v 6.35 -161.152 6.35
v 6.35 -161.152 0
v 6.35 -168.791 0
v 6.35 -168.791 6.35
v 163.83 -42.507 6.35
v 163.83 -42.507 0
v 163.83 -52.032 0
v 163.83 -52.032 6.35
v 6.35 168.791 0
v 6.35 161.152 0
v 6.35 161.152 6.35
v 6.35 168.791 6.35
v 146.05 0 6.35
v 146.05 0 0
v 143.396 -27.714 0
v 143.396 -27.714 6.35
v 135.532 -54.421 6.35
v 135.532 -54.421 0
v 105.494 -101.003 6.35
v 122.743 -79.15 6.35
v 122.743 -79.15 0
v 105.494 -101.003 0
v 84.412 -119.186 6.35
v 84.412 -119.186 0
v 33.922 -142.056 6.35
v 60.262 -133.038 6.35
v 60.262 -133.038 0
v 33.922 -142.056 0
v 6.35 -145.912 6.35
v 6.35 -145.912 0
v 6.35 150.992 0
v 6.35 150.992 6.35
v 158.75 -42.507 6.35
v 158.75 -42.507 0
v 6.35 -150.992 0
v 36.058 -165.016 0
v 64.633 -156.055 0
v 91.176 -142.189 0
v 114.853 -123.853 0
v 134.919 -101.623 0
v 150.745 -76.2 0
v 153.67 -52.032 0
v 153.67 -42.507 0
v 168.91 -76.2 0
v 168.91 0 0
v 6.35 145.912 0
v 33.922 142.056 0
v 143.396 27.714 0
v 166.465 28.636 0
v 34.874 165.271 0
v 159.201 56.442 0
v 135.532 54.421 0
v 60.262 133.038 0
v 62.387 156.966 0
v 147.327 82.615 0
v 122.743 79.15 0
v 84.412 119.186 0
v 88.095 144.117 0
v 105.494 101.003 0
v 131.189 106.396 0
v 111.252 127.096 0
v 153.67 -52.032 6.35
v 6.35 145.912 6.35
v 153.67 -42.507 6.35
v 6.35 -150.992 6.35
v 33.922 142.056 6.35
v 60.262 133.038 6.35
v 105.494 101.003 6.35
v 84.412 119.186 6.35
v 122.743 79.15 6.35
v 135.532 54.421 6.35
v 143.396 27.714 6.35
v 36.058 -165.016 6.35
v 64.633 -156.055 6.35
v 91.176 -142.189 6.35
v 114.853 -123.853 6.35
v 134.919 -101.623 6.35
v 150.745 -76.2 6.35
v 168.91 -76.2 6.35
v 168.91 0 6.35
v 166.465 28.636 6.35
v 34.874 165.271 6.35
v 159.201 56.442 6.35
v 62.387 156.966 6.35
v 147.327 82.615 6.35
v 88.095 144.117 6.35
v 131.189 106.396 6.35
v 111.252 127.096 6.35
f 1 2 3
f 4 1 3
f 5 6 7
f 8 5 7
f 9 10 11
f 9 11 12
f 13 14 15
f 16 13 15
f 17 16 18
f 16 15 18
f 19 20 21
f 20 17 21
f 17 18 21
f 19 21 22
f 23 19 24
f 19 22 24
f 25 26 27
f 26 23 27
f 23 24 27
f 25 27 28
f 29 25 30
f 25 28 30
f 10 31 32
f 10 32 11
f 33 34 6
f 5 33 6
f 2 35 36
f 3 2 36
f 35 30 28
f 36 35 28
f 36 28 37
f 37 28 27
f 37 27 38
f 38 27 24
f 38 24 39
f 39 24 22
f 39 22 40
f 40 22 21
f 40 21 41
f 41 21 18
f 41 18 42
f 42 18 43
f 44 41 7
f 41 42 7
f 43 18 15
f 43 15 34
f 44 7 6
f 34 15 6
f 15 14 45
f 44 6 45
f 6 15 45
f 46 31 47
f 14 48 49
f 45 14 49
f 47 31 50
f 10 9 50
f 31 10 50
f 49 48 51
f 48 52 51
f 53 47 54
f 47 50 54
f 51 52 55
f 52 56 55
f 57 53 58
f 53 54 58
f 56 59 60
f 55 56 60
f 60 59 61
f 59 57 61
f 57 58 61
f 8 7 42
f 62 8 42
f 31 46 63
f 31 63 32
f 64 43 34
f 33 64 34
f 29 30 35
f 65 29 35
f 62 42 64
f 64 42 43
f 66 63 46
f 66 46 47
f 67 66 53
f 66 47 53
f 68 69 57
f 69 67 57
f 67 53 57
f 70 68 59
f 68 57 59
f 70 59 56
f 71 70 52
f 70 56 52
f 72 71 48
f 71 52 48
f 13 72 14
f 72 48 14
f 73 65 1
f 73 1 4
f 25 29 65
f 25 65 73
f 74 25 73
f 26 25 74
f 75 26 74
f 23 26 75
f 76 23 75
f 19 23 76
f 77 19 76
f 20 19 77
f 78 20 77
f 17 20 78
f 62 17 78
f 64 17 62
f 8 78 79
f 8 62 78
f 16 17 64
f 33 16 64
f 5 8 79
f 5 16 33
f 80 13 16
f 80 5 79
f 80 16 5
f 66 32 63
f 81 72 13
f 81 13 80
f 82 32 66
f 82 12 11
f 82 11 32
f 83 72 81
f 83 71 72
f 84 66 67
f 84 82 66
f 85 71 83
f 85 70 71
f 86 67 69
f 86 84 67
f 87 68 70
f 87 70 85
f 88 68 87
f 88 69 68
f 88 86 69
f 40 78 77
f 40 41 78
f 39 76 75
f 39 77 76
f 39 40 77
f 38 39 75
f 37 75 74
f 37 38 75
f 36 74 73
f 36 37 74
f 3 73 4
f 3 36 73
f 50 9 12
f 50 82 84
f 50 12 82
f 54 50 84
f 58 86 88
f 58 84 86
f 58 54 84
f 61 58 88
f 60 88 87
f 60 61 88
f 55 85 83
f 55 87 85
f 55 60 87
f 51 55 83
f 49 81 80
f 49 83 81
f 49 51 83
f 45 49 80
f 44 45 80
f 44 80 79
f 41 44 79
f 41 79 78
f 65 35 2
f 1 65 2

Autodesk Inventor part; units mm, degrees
ref_plane "YZ Plane" through (0, 0, 0) normal (1, 0, 0) x (0, 1, 0)
ref_plane "XZ Plane" through (0, 0, 0) normal (0, 1, 0) x (-1, 0, 0)
ref_plane "XY Plane" through (0, 0, 0) normal (0, 0, 1) x (1, 0, 0)
sketch "Sketch1" plane through (0, 0, 0) normal (0, 0, 1) x (1, 0, 0)
  circle A0 centre (0, 0) radius 146.05
  arc A1 (168.91, 0) -> (150.7453, -76.2) centre (0, 0) ccw
  line L0 (6.35, -145.9119) -> (6.35, -168.7906)
  circle A2 centre (-157.48, 0) radius 3.175
  line L1 (6.35, -145.9119) -> (6.35, -150.9919)
  line L2 (6.35, -150.9919) -> (-6.35, -150.9919)
  line L3 (-6.35, -150.9919) -> (-6.35, -161.1519)
  line L4 (-6.35, -161.1519) -> (6.35, -161.1519)
  line L5 (6.35, -150.9919) -> (6.35, -161.1519)
  line L6 (6.35, 145.9119) -> (6.35, 168.7906)
  line L7 (0, 0) -> (0, 200.5264) construction
  line L8 (6.35, 145.9119) -> (6.35, 150.9919) construction
  line L9 (6.35, 150.9919) -> (-12.7, 150.9919)
  line L10 (-12.7, 150.9919) -> (-12.7, 161.1519)
  line L11 (-12.7, 161.1519) -> (6.35, 161.1519)
  line L12 (0, -146.05) -> (0, 0) construction
  line L13 (168.91, 0) -> (168.91, -76.2)
  line L14 (168.91, -76.2) -> (150.7453, -76.2)
  line L15 (0, 0) -> (0, -47.2694) construction
  line L16 (0, -47.2694) -> (158.75, -47.2694) construction
  line L17 (158.75, -42.5069) -> (163.83, -42.5069)
  line L18 (163.83, -42.5069) -> (163.83, -52.0319)
  line L19 (163.83, -52.0319) -> (153.67, -52.0319)
  line L20 (153.67, -52.0319) -> (153.67, -42.5069)
  line L21 (153.67, -42.5069) -> (158.75, -42.5069)
  point P0 (0.0447, 168.91)
  point P1 (6.3947, 145.9099)
  dimension "d51" = 292.1
  dimension "d52" = 337.82
  dimension "d58" = 5.08
  dimension "d59" = 12.7
  dimension "d60" = 10.16
  dimension "d72" = 6.35
  dimension "d73" = 5.08
  dimension "d75" = 19.05
  dimension "d76" = 10.16
  dimension "d77" = 6.35
  dimension "d82" = 76.2
  dimension "d86" = 47.2694
  dimension "d87" = 158.75
  dimension "d89" = 4.7625
  dimension "d90" = 5.08
  dimension "d91" = 9.525
  dimension "d92" = 10.16
  dimension "d93" = 4.7625
extrude "Extrusion15" add sketch "Sketch1" along normal blind 6.35 contours A0 L6 A1 L13 L14 L0
properties part number "TopfemaleHoopSection_v2"
